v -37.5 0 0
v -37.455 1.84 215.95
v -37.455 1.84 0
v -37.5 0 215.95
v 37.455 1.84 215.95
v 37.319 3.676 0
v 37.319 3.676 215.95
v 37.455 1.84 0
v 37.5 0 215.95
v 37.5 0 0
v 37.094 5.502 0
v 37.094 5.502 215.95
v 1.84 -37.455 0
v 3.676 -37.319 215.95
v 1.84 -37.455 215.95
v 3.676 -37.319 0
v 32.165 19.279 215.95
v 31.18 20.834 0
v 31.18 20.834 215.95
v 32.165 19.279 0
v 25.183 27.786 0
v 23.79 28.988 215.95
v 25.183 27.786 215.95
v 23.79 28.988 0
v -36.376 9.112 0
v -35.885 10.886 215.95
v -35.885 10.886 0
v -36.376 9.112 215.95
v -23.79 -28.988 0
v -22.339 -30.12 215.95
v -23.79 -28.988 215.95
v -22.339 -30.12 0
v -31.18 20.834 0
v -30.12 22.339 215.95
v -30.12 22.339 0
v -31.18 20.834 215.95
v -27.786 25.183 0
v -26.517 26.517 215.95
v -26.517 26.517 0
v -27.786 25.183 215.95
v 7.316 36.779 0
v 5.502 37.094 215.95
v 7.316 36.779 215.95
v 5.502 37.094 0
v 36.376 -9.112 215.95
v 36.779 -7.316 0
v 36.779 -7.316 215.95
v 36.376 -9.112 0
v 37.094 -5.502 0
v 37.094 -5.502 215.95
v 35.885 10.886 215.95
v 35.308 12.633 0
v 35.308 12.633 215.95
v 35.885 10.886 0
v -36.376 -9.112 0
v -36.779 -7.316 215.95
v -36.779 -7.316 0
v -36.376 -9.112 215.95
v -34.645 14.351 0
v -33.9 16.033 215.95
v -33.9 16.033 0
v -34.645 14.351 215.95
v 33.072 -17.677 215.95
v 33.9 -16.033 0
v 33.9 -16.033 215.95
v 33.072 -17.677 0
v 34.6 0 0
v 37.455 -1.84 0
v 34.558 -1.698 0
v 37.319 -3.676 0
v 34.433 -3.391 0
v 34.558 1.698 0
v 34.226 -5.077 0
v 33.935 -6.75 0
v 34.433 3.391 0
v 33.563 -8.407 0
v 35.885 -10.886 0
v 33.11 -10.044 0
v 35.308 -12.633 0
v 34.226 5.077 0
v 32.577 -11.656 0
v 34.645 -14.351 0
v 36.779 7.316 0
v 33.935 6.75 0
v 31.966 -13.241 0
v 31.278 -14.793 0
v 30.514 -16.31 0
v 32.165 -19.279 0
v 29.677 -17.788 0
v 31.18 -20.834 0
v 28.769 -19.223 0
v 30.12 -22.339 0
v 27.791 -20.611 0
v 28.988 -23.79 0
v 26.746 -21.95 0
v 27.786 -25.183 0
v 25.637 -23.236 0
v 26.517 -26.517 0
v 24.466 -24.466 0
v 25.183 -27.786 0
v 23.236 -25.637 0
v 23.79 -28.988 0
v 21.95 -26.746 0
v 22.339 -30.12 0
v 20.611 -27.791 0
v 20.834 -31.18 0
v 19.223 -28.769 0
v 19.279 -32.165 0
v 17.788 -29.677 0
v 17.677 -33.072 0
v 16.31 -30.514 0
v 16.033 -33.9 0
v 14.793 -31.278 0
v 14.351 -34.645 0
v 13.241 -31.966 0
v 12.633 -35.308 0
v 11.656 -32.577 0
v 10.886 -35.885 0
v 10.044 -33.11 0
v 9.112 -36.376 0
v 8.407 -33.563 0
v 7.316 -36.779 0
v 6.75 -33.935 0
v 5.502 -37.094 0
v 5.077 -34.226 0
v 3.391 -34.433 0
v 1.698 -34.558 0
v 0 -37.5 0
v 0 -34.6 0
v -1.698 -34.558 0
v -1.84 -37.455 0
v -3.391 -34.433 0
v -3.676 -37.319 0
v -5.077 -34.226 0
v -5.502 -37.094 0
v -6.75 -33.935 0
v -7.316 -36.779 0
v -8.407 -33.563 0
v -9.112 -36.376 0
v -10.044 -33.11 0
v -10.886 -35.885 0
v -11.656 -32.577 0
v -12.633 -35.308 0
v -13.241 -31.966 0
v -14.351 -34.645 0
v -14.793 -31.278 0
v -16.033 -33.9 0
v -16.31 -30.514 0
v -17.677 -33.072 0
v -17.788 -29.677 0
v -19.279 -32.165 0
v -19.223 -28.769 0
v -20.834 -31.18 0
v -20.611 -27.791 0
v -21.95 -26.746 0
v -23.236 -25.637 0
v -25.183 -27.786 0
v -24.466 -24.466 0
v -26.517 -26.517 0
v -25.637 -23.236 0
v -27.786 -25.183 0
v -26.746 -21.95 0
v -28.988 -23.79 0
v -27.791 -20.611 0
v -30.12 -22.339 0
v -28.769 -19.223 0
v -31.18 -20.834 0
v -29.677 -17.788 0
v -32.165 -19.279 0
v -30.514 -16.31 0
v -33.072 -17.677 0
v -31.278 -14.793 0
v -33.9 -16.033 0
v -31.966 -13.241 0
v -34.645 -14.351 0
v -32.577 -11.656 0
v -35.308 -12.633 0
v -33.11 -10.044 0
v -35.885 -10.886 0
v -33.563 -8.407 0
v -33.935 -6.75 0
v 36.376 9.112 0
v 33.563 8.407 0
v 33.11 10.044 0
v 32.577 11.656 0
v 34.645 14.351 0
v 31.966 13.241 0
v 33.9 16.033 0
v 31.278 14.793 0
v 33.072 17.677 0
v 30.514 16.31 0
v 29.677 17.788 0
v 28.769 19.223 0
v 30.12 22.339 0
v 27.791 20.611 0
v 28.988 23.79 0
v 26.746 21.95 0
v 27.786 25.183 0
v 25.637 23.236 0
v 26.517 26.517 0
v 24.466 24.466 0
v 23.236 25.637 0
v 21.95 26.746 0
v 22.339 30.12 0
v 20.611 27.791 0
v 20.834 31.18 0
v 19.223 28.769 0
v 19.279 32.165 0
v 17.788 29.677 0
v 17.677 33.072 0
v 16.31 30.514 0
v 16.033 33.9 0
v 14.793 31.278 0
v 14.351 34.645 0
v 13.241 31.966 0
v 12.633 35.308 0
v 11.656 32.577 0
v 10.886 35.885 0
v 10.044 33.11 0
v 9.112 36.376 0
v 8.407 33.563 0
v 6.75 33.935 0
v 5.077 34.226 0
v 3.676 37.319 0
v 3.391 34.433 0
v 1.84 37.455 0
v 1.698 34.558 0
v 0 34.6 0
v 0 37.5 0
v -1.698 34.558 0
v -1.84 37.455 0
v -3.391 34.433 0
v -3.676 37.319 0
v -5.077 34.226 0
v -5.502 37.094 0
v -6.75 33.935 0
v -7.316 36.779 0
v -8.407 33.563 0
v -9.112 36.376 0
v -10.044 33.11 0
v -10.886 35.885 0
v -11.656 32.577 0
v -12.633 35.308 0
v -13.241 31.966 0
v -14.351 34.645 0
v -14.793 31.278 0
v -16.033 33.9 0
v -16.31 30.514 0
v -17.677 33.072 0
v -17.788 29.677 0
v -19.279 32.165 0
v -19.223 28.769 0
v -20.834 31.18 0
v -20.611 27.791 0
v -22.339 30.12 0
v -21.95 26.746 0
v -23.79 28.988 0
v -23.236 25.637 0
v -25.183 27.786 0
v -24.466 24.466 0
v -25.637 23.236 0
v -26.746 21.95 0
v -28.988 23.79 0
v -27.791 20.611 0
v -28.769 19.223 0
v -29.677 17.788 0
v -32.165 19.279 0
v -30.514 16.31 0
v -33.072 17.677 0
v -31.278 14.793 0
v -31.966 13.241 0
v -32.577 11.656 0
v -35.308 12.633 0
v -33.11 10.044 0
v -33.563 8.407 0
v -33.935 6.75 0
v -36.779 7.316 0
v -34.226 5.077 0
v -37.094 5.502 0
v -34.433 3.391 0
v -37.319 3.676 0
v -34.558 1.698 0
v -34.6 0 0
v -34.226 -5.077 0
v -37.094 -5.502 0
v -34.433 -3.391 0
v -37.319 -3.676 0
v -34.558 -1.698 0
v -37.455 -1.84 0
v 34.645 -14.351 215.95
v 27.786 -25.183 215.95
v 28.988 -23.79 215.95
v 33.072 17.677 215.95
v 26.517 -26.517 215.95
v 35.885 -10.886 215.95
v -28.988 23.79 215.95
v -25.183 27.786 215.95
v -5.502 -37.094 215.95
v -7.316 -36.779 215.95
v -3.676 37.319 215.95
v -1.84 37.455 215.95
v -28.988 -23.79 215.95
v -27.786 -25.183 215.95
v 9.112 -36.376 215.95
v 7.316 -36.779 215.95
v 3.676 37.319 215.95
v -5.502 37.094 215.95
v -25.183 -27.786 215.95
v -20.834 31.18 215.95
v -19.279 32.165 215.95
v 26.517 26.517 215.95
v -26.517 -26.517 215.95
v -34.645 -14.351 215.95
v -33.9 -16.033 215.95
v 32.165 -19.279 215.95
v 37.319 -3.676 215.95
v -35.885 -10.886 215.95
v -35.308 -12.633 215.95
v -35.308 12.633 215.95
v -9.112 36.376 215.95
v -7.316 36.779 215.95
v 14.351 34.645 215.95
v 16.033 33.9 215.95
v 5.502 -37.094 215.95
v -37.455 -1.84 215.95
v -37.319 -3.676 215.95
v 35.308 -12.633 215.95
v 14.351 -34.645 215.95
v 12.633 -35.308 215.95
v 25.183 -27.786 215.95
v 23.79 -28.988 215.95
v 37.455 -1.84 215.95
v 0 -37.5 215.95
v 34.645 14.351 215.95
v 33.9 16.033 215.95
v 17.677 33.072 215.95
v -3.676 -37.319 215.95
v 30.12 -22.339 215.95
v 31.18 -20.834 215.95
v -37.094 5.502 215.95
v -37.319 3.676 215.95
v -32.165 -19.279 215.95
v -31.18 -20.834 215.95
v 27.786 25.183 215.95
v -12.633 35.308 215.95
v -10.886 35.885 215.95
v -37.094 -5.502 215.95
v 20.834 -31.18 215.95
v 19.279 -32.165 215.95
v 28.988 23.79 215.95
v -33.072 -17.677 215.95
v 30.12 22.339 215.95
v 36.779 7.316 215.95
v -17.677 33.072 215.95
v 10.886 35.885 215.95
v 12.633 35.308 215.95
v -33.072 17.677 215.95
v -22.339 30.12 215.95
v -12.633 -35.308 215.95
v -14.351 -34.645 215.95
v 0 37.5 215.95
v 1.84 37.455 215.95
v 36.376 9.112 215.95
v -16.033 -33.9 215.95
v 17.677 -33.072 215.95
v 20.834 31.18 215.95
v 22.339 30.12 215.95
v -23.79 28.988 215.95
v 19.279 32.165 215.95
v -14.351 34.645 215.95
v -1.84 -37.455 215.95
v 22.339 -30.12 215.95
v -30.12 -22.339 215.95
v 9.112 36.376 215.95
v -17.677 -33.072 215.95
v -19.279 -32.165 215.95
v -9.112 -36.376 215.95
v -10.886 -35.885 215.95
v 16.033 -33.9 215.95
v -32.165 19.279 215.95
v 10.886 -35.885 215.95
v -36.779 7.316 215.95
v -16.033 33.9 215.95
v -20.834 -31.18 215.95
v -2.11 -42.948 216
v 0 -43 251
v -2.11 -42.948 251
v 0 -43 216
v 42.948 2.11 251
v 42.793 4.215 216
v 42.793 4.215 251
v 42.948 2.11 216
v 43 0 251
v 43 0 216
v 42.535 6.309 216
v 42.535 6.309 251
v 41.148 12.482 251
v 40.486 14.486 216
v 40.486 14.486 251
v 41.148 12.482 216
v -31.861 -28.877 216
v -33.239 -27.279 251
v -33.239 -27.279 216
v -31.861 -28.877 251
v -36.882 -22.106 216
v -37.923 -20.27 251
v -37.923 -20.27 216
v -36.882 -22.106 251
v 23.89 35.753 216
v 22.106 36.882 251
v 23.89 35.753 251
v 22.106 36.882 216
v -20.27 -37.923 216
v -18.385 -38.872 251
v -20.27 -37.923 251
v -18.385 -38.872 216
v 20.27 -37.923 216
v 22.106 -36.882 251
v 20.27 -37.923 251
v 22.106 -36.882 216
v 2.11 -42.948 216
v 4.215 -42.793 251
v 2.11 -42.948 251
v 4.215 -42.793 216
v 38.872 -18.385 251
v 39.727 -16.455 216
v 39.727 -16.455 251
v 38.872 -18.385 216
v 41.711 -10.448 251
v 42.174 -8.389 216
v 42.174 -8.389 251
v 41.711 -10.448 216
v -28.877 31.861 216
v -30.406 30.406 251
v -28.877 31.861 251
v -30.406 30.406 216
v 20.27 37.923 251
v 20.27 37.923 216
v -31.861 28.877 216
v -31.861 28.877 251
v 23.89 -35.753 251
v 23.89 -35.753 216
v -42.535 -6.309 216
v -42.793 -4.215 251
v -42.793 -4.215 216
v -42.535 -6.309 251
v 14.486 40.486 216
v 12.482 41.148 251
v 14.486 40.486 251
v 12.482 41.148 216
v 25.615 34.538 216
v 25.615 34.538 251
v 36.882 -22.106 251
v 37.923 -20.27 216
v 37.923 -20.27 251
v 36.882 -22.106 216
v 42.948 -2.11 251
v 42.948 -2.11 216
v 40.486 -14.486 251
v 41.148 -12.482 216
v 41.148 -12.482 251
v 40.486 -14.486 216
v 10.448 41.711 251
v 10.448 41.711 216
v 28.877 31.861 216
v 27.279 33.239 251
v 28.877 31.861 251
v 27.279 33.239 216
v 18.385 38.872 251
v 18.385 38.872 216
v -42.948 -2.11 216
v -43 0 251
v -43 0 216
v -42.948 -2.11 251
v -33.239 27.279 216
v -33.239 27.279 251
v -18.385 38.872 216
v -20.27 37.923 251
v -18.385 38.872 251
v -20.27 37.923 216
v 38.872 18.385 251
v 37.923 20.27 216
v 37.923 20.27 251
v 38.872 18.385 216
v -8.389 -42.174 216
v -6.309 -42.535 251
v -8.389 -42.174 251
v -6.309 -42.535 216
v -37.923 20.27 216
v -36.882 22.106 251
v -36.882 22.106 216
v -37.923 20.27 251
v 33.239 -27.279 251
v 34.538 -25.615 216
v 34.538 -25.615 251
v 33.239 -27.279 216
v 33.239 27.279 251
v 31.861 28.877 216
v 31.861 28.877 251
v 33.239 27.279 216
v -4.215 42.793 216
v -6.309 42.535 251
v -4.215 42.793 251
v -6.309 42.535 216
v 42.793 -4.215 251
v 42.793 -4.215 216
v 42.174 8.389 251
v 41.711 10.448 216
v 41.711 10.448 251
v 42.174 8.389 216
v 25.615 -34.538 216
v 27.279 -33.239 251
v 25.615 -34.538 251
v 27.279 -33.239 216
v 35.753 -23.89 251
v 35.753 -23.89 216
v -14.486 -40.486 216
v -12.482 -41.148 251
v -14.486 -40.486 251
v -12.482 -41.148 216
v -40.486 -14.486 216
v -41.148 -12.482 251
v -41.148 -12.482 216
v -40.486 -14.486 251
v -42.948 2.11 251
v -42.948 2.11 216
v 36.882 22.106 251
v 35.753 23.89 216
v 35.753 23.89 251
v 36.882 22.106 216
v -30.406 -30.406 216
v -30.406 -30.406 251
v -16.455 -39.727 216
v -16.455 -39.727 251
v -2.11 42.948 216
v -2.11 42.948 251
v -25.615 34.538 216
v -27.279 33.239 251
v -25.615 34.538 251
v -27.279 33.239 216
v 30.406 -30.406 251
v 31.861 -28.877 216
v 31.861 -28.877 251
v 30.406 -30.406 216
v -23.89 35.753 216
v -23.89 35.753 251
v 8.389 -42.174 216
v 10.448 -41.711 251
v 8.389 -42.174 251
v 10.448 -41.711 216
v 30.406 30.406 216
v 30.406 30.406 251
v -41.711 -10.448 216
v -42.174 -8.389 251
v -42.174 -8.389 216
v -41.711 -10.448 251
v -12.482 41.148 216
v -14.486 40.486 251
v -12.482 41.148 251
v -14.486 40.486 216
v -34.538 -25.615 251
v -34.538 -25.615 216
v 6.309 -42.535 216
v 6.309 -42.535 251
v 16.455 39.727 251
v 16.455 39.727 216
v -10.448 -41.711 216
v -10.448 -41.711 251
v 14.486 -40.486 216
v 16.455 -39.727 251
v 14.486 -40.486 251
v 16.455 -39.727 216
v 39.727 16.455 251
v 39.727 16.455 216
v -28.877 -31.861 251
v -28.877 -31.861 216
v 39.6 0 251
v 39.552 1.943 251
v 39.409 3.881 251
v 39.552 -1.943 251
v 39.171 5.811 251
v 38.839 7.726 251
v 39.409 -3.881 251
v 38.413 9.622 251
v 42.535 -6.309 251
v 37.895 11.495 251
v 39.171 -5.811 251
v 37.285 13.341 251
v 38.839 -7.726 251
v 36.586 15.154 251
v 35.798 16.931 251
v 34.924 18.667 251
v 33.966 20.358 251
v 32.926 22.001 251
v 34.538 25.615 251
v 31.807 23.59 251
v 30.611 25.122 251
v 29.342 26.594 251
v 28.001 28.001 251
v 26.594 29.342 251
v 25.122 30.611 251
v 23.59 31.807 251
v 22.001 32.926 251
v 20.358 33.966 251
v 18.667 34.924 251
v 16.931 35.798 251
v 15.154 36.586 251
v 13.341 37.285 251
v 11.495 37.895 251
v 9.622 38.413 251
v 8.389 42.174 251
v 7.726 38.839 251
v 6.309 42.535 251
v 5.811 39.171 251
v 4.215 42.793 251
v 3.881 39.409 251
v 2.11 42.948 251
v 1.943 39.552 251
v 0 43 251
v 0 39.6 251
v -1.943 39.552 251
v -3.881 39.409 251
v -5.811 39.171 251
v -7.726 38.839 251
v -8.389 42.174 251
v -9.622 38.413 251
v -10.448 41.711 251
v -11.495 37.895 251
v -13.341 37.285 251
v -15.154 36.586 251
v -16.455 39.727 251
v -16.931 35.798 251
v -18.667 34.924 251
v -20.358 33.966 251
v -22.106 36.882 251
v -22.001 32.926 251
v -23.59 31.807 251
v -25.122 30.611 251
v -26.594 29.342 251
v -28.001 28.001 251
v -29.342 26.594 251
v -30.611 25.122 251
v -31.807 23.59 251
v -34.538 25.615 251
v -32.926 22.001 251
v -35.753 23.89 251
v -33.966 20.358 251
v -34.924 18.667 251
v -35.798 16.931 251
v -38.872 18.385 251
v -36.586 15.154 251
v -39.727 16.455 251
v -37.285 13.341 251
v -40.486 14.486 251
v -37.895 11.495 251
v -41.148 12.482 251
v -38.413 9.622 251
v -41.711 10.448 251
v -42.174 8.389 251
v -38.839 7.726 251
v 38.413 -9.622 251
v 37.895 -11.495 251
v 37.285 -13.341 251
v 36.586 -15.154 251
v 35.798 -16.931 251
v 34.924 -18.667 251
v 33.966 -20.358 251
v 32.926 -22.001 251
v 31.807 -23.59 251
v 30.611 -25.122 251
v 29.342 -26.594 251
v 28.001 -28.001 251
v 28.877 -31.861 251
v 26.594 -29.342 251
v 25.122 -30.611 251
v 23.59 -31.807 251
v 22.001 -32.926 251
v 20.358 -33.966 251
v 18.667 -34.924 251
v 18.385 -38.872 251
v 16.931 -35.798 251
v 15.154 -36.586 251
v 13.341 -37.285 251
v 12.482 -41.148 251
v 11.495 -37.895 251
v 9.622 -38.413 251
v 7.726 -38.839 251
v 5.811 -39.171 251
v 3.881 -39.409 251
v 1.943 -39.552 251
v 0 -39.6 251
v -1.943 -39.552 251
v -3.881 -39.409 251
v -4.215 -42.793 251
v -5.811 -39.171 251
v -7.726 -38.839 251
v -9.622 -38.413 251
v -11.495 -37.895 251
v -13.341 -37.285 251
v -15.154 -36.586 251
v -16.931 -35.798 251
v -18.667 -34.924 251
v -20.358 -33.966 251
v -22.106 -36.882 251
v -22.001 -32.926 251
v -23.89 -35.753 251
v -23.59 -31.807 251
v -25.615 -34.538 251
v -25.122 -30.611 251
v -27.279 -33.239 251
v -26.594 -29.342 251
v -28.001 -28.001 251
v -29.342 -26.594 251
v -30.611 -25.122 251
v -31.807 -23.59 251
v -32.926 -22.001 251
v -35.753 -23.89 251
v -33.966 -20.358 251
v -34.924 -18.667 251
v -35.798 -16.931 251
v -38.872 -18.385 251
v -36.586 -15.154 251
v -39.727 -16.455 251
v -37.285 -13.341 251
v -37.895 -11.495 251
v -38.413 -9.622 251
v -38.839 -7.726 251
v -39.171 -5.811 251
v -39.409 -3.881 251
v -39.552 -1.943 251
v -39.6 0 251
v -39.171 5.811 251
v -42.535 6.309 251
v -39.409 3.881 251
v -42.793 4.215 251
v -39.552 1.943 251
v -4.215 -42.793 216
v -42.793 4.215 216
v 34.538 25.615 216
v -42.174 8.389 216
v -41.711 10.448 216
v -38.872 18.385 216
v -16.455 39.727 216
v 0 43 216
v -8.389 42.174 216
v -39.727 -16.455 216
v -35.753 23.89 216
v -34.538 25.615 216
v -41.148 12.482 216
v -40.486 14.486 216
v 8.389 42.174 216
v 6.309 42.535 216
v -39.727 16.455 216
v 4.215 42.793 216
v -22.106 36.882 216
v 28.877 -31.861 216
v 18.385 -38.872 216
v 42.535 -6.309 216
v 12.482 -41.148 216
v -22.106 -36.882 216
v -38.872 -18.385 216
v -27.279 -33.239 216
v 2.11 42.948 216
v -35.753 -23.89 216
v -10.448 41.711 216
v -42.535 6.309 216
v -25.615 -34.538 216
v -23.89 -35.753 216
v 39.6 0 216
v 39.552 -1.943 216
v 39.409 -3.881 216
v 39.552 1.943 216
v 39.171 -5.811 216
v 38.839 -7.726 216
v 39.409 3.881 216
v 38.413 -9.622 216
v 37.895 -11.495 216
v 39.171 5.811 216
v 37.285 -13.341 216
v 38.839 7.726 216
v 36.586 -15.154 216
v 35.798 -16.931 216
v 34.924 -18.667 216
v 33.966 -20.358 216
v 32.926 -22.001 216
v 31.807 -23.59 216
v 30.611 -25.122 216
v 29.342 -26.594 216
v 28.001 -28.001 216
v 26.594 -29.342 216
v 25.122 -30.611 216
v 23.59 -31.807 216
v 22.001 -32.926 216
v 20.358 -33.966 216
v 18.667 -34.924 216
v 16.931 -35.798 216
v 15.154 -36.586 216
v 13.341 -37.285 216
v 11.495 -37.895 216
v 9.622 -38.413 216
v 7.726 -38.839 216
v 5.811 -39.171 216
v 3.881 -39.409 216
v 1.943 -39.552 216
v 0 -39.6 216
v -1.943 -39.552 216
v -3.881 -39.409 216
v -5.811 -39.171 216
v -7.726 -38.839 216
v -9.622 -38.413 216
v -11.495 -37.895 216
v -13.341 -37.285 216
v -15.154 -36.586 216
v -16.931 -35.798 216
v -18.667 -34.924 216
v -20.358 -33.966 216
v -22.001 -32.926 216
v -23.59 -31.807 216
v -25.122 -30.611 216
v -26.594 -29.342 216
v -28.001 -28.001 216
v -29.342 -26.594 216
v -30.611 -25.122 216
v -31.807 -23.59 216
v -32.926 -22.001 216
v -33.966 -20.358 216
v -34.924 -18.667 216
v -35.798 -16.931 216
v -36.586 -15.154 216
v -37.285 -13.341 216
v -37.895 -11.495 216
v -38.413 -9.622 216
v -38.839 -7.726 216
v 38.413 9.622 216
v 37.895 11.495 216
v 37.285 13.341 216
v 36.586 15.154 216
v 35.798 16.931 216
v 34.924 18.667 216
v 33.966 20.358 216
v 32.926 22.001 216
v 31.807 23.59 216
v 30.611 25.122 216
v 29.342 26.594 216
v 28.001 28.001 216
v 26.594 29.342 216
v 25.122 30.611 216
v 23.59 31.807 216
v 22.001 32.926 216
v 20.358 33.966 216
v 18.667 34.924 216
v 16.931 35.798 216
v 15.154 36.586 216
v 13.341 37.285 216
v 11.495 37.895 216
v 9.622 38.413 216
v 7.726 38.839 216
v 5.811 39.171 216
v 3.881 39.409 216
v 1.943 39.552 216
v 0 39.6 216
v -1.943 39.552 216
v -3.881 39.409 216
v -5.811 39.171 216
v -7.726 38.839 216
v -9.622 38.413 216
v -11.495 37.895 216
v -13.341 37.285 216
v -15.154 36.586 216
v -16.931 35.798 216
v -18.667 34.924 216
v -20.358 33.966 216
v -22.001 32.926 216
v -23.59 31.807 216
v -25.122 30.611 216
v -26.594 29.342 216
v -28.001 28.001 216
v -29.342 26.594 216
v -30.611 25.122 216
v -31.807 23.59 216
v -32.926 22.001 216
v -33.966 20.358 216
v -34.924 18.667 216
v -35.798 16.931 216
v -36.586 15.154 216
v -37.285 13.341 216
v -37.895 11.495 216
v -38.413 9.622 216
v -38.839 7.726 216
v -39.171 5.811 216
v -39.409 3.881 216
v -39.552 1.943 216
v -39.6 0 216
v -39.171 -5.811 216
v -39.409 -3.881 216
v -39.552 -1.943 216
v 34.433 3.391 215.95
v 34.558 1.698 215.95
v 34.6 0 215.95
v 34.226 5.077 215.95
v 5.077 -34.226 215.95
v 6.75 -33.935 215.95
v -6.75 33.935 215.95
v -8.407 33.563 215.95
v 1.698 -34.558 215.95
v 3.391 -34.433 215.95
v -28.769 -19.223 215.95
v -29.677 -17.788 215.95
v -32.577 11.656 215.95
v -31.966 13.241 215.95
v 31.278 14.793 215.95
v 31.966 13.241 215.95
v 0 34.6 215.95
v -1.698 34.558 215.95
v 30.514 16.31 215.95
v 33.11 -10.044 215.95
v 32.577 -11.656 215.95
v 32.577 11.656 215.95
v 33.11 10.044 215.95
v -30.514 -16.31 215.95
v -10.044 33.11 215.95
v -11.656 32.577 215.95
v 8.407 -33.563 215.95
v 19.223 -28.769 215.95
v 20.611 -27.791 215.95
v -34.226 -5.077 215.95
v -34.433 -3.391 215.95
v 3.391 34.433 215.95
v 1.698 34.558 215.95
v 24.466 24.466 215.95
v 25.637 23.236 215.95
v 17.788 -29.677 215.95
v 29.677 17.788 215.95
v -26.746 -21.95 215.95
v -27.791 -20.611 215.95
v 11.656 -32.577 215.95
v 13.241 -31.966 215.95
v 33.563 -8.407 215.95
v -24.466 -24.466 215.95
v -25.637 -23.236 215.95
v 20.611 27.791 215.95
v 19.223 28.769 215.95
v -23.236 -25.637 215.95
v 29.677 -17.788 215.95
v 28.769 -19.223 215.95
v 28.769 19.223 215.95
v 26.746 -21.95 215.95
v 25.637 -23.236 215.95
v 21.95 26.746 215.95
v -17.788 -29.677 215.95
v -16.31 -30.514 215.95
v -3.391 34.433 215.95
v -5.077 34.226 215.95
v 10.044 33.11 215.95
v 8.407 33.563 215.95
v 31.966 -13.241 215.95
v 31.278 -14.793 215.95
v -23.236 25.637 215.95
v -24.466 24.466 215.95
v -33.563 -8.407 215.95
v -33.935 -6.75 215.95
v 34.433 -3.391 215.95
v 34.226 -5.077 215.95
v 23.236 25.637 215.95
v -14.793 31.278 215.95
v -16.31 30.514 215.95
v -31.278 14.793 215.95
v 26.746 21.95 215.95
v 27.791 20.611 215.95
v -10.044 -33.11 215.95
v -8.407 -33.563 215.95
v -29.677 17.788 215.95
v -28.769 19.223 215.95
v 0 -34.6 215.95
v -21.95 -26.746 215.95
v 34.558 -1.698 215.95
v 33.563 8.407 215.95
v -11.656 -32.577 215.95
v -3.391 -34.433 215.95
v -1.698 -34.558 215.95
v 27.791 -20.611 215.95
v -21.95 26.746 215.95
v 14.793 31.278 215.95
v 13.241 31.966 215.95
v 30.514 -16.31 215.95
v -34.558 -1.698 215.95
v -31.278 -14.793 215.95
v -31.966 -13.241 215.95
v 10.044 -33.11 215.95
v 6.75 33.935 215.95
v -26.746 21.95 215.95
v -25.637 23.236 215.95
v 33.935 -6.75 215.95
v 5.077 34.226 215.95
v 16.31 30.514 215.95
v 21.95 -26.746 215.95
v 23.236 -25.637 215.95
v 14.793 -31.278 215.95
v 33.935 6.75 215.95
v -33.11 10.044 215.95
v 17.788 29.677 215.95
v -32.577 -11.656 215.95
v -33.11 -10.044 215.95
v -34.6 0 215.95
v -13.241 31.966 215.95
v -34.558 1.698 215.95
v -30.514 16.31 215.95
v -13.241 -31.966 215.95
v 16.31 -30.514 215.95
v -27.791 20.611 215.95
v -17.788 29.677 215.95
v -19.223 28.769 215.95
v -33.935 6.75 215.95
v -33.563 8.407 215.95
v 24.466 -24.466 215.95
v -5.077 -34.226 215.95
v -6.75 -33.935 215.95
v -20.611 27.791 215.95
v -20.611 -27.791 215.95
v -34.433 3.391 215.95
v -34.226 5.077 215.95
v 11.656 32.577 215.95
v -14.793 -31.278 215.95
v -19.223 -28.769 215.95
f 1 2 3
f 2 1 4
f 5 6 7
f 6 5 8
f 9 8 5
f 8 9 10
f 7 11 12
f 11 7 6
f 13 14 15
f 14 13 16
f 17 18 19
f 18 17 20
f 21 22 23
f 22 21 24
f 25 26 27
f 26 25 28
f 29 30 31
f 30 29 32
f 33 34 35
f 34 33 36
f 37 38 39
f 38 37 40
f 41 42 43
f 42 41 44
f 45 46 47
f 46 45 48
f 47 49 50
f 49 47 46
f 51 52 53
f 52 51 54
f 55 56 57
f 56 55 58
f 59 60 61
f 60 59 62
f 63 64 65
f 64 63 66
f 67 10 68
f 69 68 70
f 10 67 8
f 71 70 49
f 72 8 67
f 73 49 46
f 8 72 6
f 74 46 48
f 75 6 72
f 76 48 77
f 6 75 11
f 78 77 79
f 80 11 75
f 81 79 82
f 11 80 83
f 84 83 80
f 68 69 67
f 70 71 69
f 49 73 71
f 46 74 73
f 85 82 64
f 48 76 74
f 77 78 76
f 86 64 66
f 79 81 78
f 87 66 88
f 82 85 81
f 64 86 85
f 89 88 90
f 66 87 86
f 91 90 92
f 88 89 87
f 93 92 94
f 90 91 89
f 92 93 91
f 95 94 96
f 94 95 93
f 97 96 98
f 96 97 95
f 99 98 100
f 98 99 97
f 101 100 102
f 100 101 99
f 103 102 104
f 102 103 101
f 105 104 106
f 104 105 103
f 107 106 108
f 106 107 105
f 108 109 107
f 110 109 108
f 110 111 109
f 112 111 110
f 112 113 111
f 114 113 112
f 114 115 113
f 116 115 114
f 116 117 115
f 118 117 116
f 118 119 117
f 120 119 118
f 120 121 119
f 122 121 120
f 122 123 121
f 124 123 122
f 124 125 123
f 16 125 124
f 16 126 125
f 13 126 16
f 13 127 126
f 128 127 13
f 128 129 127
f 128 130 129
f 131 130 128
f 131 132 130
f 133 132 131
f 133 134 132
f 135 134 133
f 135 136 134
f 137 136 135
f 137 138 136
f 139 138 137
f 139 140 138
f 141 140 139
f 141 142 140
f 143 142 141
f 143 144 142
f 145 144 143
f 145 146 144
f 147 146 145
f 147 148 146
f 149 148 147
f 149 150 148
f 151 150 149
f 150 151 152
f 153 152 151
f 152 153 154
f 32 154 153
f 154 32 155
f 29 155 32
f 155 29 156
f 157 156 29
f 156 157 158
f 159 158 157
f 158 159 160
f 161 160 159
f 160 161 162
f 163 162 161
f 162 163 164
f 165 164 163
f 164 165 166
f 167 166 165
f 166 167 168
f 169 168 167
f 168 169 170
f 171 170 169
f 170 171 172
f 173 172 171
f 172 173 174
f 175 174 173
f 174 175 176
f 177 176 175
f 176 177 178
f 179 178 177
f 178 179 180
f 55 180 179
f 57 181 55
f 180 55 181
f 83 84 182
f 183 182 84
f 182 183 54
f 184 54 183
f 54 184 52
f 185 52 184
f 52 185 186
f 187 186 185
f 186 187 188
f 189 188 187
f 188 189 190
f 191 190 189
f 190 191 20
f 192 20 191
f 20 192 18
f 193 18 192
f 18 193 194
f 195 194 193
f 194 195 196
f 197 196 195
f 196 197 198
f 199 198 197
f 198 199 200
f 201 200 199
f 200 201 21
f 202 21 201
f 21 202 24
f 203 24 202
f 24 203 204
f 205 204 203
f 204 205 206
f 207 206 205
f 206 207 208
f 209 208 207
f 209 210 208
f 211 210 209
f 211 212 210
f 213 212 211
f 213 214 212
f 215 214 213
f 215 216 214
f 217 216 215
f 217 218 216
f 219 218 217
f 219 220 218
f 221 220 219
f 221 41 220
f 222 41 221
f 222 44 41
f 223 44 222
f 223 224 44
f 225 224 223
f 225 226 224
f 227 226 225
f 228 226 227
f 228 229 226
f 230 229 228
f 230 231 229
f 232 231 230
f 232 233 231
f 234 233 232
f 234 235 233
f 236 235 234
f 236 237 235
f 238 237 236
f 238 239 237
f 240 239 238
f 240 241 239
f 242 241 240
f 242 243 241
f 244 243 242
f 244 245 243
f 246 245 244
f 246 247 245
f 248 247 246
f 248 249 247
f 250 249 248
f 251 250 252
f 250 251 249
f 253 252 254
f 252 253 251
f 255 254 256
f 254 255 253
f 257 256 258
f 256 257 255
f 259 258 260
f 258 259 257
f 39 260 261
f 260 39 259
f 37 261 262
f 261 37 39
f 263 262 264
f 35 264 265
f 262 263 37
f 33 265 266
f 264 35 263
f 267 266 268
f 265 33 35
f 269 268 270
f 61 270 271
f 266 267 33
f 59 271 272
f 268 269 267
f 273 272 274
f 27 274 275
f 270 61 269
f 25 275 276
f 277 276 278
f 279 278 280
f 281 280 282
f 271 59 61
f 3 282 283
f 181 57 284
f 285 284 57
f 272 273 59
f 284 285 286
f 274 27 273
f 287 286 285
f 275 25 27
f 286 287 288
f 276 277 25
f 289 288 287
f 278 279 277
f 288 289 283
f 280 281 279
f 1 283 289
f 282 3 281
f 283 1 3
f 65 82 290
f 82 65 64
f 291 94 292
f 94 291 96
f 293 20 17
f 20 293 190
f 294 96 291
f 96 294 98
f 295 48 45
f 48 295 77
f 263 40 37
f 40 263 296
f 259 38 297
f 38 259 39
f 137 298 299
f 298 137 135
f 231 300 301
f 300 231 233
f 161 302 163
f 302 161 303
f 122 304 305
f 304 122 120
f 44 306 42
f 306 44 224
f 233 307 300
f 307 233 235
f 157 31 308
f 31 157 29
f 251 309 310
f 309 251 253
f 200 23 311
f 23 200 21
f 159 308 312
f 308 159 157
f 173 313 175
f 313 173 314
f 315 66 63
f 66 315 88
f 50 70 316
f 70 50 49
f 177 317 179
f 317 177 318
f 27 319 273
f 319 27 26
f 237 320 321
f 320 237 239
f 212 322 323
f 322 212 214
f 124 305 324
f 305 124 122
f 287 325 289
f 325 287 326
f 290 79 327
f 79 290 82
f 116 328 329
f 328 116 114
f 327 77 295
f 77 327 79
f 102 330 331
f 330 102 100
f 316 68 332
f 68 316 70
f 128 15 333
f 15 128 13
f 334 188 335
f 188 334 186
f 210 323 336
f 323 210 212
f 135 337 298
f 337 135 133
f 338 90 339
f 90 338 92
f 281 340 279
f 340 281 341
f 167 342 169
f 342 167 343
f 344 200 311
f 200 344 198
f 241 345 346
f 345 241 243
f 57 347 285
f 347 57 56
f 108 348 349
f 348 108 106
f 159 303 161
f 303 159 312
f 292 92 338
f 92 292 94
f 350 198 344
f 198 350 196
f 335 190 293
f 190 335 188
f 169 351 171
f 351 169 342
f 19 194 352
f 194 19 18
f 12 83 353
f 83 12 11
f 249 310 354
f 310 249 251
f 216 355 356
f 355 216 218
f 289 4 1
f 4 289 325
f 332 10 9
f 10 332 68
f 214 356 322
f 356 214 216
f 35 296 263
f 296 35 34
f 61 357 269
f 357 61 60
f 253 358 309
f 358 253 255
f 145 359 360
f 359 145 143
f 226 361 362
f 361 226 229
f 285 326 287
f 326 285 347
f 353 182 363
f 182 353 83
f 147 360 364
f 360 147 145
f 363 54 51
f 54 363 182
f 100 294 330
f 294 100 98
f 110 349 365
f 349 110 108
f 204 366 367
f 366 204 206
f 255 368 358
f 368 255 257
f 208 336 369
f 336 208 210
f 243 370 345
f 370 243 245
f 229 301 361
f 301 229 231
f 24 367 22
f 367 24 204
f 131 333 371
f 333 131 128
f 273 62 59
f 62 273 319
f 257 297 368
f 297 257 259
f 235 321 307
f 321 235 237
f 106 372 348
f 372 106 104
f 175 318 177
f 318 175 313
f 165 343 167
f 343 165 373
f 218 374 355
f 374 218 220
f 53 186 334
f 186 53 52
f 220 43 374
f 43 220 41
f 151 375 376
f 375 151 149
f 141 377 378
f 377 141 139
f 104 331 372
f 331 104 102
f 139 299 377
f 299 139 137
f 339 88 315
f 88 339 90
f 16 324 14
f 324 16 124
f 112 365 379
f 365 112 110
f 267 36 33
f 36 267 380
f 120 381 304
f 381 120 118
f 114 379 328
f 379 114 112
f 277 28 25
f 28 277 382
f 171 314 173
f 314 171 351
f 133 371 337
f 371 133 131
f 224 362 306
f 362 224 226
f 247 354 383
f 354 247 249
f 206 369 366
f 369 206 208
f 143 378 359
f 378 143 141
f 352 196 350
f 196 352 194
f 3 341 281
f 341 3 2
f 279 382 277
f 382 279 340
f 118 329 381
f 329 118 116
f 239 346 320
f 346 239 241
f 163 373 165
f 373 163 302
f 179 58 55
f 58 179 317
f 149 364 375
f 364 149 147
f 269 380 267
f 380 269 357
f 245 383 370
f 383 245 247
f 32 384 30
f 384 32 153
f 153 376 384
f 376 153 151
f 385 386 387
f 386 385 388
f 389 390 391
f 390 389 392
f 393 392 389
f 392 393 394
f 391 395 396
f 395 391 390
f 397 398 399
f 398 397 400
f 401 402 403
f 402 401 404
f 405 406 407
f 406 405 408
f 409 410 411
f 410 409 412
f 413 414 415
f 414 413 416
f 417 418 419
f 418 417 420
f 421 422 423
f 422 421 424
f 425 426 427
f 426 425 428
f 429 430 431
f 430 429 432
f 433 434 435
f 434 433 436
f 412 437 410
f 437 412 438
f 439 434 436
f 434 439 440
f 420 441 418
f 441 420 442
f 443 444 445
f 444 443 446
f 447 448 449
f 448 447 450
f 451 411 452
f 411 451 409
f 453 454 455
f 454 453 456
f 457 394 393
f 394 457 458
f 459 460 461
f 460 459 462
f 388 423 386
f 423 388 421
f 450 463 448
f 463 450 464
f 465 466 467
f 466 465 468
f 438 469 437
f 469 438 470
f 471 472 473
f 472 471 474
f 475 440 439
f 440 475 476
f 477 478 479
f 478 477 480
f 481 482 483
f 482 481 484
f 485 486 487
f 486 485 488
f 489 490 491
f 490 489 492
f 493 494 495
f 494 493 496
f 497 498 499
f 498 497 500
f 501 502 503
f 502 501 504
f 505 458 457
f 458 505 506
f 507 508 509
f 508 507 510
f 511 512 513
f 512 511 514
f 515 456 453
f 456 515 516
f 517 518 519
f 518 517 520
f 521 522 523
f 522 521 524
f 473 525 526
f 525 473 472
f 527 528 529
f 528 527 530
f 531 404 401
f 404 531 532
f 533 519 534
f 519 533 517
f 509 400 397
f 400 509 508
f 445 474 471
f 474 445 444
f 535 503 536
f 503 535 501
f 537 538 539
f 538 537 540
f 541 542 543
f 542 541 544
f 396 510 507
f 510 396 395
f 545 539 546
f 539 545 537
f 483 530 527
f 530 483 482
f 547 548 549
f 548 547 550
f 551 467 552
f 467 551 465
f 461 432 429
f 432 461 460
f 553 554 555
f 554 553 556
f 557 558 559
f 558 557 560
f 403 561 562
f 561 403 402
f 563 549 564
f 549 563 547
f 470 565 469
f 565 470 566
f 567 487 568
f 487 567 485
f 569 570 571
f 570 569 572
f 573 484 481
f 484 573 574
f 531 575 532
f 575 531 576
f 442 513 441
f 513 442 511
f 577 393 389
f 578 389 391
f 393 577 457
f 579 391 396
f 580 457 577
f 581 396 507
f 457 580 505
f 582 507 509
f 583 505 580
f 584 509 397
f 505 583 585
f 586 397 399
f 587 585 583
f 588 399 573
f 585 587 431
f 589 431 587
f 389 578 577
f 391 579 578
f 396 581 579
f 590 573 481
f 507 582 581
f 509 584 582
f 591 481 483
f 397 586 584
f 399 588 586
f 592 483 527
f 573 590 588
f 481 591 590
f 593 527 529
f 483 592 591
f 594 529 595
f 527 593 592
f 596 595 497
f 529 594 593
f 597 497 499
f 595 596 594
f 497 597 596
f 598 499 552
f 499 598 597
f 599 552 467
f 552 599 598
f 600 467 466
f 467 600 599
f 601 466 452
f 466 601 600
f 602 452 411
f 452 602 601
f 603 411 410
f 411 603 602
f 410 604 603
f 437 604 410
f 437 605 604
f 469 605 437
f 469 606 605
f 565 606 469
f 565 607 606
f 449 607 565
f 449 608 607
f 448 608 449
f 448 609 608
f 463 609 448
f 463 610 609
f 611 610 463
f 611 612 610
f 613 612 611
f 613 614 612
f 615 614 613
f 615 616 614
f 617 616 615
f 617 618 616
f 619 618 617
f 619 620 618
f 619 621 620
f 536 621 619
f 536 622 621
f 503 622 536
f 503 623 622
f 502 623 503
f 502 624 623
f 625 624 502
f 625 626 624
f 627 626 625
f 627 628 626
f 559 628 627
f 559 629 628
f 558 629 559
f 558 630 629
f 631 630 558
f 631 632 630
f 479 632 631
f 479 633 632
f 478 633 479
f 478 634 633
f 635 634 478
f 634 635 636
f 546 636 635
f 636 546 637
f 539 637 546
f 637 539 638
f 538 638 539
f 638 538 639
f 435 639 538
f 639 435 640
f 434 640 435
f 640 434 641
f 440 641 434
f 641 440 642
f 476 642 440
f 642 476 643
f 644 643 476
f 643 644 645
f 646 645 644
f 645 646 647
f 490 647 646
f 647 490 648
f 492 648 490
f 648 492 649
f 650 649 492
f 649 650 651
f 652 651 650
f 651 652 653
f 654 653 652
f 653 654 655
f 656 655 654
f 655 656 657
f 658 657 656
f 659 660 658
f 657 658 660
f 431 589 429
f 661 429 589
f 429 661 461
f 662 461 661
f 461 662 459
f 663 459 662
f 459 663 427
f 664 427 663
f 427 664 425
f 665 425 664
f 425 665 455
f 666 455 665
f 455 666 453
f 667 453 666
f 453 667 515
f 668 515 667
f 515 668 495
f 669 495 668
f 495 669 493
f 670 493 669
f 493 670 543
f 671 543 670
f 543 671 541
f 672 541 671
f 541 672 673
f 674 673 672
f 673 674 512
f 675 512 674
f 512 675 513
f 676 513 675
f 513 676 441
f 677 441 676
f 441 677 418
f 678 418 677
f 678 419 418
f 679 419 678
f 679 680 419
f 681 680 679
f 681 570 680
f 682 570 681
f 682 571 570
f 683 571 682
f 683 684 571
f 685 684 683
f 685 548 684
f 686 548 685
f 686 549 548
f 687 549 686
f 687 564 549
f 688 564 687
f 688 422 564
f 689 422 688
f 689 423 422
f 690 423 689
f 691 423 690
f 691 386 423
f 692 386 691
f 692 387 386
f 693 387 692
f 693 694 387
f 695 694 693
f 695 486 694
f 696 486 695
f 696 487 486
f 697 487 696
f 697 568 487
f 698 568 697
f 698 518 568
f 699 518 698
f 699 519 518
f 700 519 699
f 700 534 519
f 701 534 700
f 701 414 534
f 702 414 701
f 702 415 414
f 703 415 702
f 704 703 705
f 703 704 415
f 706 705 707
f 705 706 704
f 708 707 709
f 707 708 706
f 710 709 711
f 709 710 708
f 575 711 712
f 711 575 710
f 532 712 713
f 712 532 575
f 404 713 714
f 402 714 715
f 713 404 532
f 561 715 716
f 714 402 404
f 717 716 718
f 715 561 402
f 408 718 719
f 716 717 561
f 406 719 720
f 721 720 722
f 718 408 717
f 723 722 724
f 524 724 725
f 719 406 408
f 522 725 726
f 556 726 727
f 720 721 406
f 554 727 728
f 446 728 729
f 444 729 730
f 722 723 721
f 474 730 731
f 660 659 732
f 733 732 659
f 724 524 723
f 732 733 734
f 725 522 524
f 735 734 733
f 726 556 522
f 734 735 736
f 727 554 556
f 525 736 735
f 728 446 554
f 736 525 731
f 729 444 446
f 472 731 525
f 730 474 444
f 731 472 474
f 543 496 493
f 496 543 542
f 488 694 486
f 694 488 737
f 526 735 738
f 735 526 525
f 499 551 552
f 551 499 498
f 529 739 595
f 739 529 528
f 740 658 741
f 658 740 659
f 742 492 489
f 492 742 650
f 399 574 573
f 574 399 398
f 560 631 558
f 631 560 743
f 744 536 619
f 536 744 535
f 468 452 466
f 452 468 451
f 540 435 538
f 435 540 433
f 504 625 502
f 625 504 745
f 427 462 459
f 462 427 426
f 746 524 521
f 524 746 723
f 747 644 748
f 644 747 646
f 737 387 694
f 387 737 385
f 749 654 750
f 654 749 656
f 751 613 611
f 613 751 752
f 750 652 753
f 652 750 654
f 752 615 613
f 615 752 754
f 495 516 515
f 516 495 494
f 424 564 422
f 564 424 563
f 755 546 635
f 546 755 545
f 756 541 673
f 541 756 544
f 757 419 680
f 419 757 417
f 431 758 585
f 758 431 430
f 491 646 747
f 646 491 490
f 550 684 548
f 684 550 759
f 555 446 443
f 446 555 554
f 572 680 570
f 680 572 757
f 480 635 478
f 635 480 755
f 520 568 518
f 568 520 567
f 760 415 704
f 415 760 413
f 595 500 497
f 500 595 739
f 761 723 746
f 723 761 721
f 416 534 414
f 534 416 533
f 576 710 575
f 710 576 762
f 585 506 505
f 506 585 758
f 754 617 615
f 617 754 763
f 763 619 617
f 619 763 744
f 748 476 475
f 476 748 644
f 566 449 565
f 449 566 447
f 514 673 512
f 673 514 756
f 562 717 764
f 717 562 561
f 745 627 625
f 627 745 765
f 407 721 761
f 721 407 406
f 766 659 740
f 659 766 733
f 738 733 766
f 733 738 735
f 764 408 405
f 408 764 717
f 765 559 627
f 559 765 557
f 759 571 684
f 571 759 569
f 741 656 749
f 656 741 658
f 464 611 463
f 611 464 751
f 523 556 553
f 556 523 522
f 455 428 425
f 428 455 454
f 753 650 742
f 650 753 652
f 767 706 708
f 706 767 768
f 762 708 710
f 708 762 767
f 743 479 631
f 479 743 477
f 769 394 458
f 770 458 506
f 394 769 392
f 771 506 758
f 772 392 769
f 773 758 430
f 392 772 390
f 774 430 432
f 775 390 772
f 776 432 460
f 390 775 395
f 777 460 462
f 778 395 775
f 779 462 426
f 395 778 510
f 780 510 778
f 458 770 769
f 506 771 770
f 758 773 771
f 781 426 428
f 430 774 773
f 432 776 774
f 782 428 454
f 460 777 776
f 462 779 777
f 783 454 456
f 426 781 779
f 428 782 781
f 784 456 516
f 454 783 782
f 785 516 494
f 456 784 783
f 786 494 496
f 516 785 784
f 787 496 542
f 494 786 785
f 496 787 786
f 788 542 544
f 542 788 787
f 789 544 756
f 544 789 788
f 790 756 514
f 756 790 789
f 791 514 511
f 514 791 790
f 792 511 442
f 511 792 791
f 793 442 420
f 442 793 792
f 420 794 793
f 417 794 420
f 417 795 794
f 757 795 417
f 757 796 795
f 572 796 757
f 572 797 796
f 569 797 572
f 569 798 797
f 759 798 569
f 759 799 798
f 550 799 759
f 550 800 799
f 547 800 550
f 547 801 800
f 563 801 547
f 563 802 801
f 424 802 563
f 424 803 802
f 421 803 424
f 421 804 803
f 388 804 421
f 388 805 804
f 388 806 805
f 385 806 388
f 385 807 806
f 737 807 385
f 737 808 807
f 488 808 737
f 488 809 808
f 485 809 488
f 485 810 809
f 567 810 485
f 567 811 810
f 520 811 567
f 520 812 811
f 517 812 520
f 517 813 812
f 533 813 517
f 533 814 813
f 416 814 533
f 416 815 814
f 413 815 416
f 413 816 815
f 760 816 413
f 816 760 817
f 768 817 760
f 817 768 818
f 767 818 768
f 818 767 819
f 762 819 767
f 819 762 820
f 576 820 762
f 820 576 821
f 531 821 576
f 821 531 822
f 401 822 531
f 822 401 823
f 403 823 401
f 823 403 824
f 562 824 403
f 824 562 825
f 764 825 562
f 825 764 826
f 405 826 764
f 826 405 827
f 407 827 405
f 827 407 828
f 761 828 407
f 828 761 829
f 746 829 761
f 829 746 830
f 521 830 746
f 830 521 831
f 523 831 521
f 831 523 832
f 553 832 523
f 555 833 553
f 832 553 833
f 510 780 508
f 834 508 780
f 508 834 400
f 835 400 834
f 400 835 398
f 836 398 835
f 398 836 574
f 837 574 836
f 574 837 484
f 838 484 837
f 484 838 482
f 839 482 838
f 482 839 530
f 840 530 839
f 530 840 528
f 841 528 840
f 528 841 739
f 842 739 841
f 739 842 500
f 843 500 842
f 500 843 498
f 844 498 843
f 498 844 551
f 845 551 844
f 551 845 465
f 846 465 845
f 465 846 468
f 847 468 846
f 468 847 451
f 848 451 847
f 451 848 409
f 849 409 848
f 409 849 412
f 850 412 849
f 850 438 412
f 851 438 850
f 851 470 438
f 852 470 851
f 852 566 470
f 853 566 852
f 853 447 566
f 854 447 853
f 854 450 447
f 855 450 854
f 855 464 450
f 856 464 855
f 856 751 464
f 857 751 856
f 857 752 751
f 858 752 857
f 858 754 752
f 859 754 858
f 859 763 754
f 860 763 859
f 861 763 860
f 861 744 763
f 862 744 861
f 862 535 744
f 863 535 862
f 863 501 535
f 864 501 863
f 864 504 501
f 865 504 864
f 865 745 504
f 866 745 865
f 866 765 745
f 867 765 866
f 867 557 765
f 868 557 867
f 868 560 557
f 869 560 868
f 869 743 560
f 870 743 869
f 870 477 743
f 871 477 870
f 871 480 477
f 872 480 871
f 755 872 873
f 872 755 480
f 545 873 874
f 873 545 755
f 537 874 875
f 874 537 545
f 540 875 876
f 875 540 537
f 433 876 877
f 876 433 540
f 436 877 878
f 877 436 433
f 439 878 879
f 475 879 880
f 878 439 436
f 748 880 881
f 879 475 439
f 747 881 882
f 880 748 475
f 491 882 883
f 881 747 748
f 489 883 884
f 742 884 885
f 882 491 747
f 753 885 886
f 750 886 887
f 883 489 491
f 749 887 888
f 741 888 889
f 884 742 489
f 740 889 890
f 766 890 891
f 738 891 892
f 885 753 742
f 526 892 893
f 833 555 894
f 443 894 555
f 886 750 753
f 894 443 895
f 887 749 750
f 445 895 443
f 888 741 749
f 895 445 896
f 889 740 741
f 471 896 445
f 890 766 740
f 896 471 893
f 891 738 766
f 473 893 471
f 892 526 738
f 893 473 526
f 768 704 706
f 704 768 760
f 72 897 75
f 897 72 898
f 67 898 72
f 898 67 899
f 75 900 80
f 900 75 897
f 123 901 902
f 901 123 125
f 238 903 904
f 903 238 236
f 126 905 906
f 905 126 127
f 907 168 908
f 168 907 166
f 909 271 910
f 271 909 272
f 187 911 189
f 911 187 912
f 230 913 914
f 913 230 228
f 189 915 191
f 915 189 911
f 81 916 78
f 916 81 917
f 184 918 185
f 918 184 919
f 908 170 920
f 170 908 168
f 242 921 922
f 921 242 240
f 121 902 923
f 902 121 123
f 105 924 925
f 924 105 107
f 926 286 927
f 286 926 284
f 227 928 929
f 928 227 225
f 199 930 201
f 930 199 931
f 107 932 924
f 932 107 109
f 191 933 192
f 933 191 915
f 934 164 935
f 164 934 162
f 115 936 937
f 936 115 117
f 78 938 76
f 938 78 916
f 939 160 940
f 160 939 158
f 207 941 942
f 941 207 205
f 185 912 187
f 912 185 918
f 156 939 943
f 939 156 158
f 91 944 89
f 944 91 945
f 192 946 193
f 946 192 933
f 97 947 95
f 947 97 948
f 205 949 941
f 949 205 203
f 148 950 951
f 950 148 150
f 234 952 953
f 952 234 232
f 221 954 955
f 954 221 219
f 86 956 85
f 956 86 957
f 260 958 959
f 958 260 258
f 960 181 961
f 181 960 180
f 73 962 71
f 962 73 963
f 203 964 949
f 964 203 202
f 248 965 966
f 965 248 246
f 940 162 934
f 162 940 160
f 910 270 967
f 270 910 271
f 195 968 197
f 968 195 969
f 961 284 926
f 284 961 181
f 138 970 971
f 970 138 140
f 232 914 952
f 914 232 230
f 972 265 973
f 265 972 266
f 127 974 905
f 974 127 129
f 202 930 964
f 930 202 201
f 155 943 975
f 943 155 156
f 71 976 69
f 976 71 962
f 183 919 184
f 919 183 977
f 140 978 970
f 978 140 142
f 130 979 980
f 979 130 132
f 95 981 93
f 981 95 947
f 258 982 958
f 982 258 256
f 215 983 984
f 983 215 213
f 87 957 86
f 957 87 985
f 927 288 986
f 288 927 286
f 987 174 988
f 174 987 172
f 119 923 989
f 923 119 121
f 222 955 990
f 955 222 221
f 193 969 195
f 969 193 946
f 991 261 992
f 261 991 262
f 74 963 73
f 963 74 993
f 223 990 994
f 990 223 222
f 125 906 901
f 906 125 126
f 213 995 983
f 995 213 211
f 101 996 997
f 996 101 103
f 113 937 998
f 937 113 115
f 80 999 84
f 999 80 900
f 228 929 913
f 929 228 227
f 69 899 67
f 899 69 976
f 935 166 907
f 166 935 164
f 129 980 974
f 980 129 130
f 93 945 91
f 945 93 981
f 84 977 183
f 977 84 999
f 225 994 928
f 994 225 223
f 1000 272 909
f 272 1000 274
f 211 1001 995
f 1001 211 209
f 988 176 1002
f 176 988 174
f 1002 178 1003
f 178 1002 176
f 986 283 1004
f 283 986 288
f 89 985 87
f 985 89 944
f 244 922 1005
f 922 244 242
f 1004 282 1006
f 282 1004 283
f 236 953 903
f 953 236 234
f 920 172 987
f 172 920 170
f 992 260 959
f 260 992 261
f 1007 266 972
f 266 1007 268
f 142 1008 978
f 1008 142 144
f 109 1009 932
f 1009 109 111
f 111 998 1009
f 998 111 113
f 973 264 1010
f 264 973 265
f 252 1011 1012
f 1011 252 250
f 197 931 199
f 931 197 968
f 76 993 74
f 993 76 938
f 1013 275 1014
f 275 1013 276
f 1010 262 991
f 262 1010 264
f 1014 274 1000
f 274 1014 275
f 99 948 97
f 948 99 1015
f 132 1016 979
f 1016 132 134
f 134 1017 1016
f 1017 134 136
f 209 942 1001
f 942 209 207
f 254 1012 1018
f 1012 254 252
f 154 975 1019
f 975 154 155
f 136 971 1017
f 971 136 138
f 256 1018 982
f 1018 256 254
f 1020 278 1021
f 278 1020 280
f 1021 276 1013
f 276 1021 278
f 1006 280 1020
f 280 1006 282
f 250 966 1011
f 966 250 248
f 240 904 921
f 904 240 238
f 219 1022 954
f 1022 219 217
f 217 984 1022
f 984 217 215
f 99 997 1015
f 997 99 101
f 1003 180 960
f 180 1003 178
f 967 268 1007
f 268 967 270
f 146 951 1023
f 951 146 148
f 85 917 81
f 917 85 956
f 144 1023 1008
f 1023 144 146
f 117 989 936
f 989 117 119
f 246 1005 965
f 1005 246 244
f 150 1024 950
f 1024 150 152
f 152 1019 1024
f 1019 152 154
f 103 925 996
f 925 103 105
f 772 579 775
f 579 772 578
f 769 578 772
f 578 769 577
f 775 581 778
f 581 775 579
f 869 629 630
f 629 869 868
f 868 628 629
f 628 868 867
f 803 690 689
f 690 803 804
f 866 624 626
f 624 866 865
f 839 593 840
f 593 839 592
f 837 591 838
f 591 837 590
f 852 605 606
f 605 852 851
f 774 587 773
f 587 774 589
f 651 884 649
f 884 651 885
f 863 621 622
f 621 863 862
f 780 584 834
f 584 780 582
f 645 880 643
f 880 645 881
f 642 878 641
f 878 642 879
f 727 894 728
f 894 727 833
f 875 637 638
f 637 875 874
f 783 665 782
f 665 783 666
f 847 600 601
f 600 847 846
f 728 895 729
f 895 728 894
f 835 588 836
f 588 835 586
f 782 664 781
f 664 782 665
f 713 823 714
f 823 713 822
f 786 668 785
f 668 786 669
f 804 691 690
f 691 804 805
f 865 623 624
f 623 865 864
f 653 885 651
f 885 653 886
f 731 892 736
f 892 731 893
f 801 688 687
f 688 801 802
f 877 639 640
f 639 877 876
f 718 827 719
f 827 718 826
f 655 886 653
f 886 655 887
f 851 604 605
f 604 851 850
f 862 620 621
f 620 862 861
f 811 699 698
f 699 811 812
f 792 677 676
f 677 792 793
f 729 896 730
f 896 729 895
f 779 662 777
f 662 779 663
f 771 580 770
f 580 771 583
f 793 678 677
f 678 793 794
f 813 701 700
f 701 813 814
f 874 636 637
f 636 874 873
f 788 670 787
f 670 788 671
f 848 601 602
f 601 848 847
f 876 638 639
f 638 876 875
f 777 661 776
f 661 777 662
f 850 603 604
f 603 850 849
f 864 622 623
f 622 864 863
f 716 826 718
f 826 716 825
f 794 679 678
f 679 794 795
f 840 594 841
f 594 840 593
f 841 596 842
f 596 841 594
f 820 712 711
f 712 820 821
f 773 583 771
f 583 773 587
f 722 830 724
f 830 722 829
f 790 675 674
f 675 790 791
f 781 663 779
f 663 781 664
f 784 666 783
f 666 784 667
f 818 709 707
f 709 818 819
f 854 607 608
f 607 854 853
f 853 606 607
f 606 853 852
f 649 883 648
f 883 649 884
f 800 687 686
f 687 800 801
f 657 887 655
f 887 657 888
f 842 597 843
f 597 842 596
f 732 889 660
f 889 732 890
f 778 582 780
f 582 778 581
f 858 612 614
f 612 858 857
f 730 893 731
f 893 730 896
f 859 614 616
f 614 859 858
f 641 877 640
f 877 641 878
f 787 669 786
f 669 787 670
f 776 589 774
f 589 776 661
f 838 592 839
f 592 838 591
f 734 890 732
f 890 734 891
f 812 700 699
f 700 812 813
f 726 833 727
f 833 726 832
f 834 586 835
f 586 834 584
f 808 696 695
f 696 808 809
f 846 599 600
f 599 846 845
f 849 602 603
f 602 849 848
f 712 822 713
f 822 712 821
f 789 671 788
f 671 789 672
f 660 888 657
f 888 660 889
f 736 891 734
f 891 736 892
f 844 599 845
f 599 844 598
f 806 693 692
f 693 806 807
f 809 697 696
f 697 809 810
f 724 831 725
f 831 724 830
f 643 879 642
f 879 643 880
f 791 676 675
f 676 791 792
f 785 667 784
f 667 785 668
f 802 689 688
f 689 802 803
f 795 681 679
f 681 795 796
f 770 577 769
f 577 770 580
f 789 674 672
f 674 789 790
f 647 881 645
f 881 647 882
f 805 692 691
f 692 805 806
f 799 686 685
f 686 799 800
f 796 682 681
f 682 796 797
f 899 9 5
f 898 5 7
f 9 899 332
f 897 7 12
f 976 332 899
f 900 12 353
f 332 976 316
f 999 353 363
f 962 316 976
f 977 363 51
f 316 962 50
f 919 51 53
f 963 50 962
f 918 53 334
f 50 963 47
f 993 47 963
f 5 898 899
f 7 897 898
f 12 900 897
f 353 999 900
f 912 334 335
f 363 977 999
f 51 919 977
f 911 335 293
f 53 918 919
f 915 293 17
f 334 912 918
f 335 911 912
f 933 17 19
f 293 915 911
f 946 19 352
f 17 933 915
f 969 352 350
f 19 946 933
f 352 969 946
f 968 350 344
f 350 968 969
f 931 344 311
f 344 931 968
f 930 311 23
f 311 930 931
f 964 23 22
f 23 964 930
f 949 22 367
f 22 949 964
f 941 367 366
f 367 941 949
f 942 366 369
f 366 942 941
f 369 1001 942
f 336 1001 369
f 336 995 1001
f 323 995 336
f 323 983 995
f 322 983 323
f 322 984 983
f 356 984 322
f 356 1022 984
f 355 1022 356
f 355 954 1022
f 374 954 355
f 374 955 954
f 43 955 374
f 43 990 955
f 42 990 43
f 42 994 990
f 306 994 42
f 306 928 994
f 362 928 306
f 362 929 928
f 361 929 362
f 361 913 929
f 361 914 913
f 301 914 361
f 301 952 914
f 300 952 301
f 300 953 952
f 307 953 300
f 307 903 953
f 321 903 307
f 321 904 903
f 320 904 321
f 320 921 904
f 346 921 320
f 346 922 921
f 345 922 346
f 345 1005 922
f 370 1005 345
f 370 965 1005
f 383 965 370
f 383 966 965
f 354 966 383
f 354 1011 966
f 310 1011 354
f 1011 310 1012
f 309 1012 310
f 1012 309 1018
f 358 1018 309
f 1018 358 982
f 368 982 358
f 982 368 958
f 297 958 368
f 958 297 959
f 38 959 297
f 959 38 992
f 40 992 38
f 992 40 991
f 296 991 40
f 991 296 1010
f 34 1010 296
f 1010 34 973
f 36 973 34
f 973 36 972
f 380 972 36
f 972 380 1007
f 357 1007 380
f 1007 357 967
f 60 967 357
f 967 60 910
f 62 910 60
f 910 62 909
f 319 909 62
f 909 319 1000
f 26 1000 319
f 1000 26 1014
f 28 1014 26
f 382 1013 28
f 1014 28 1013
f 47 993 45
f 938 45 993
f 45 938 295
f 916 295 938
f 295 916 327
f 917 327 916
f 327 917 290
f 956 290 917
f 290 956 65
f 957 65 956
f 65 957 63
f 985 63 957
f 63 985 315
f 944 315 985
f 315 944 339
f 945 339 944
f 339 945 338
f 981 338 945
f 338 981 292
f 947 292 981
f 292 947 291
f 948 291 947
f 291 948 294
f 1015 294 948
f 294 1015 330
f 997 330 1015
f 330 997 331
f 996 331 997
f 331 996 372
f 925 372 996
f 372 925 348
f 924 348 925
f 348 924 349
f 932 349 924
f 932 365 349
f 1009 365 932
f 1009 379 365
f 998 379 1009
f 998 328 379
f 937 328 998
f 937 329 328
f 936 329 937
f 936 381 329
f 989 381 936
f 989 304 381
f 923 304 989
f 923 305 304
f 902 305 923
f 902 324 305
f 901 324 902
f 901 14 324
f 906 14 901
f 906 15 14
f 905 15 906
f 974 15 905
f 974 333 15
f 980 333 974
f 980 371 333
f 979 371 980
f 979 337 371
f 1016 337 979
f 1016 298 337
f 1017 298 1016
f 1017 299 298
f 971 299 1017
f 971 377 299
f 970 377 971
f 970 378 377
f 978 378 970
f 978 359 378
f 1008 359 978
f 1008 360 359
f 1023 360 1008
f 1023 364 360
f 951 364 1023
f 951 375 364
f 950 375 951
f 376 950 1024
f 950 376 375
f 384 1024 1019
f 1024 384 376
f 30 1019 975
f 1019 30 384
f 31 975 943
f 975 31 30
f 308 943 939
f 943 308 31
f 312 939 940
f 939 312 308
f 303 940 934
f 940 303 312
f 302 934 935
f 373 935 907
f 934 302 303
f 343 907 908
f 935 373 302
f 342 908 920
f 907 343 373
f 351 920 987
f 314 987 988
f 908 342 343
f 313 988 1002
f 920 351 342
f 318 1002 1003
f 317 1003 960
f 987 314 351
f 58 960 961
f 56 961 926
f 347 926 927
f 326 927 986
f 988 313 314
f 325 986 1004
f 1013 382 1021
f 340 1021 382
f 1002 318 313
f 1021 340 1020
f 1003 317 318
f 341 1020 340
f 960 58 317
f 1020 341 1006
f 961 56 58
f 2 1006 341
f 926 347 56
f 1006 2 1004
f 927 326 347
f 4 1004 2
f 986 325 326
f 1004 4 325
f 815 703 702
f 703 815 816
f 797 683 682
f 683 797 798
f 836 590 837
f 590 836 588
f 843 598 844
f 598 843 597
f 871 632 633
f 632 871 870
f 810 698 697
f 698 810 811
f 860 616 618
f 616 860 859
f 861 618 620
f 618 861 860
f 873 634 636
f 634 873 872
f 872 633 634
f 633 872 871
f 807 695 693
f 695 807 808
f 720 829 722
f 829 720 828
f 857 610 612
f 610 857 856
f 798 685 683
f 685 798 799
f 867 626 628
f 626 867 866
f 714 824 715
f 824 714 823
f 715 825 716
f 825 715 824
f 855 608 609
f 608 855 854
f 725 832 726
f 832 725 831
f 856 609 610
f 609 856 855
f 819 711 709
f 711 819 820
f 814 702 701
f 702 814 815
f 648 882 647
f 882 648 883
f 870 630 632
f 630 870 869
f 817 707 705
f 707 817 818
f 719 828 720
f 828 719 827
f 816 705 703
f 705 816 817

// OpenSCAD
// Parameters
pipe_standard = 1; //[1:1:1]
nominal_size = 75; //[40:160:1]
length_mm = 250; //[125:500:1]
ht75_outer_diameter = 75; //[60:90:0.5]
ht75_wall_thickness = 2.7; //[1.5:5.4:0.1]
fitting_length = 35; //[20:70:1]
fitting_outer_diameter = 86; //[78:110:0.5]
fitting_wall_thickness = 3.2; //[2:6.4:0.1]
connection_overlap = 1; //[0.5:2:0.1]
bore_clearance = 0.2; //[0:0.6:0.05]

$fn = 128;

// HT Pipe Segment - ONE connected solid (outer union, inner void subtracted once)
module ht_pipe() {
    outer_r = ht75_outer_diameter/2;
    inner_r = outer_r - ht75_wall_thickness - bore_clearance;

    fit_outer_r = fitting_outer_diameter/2;
    fit_inner_r = fit_outer_r - fitting_wall_thickness - bore_clearance;

    // Ensure valid radii
    inner_r2 = max(0.01, inner_r);
    fit_inner_r2 = max(0.01, fit_inner_r);

    // Socket overlaps into pipe to guarantee connection
    fit_z0 = length_mm - fitting_length + connection_overlap;

    // Inner bores extend slightly beyond ends to avoid coplanar/blank artifacts
    eps = 0.05;

    color([0.85, 0.85, 0.8])
    difference() {
        // OUTER: union of pipe + socket (connected via overlap)
        union() {
            cylinder(h=length_mm, r=outer_r, center=false);
            translate([0, 0, fit_z0])
                cylinder(h=fitting_length, r=fit_outer_r, center=false);
        }

        // INNER: continuous bore through entire part
        union() {
            // Pipe bore
            translate([0, 0, -eps])
                cylinder(h=length_mm + 2*eps, r=inner_r2, center=false);

            // Socket bore
            translate([0, 0, fit_z0 - eps])
                cylinder(h=fitting_length + 2*eps, r=fit_inner_r2, center=false);
        }
    }
}

// Assembly
module assembly() {
    ht_pipe();
}

assembly();
